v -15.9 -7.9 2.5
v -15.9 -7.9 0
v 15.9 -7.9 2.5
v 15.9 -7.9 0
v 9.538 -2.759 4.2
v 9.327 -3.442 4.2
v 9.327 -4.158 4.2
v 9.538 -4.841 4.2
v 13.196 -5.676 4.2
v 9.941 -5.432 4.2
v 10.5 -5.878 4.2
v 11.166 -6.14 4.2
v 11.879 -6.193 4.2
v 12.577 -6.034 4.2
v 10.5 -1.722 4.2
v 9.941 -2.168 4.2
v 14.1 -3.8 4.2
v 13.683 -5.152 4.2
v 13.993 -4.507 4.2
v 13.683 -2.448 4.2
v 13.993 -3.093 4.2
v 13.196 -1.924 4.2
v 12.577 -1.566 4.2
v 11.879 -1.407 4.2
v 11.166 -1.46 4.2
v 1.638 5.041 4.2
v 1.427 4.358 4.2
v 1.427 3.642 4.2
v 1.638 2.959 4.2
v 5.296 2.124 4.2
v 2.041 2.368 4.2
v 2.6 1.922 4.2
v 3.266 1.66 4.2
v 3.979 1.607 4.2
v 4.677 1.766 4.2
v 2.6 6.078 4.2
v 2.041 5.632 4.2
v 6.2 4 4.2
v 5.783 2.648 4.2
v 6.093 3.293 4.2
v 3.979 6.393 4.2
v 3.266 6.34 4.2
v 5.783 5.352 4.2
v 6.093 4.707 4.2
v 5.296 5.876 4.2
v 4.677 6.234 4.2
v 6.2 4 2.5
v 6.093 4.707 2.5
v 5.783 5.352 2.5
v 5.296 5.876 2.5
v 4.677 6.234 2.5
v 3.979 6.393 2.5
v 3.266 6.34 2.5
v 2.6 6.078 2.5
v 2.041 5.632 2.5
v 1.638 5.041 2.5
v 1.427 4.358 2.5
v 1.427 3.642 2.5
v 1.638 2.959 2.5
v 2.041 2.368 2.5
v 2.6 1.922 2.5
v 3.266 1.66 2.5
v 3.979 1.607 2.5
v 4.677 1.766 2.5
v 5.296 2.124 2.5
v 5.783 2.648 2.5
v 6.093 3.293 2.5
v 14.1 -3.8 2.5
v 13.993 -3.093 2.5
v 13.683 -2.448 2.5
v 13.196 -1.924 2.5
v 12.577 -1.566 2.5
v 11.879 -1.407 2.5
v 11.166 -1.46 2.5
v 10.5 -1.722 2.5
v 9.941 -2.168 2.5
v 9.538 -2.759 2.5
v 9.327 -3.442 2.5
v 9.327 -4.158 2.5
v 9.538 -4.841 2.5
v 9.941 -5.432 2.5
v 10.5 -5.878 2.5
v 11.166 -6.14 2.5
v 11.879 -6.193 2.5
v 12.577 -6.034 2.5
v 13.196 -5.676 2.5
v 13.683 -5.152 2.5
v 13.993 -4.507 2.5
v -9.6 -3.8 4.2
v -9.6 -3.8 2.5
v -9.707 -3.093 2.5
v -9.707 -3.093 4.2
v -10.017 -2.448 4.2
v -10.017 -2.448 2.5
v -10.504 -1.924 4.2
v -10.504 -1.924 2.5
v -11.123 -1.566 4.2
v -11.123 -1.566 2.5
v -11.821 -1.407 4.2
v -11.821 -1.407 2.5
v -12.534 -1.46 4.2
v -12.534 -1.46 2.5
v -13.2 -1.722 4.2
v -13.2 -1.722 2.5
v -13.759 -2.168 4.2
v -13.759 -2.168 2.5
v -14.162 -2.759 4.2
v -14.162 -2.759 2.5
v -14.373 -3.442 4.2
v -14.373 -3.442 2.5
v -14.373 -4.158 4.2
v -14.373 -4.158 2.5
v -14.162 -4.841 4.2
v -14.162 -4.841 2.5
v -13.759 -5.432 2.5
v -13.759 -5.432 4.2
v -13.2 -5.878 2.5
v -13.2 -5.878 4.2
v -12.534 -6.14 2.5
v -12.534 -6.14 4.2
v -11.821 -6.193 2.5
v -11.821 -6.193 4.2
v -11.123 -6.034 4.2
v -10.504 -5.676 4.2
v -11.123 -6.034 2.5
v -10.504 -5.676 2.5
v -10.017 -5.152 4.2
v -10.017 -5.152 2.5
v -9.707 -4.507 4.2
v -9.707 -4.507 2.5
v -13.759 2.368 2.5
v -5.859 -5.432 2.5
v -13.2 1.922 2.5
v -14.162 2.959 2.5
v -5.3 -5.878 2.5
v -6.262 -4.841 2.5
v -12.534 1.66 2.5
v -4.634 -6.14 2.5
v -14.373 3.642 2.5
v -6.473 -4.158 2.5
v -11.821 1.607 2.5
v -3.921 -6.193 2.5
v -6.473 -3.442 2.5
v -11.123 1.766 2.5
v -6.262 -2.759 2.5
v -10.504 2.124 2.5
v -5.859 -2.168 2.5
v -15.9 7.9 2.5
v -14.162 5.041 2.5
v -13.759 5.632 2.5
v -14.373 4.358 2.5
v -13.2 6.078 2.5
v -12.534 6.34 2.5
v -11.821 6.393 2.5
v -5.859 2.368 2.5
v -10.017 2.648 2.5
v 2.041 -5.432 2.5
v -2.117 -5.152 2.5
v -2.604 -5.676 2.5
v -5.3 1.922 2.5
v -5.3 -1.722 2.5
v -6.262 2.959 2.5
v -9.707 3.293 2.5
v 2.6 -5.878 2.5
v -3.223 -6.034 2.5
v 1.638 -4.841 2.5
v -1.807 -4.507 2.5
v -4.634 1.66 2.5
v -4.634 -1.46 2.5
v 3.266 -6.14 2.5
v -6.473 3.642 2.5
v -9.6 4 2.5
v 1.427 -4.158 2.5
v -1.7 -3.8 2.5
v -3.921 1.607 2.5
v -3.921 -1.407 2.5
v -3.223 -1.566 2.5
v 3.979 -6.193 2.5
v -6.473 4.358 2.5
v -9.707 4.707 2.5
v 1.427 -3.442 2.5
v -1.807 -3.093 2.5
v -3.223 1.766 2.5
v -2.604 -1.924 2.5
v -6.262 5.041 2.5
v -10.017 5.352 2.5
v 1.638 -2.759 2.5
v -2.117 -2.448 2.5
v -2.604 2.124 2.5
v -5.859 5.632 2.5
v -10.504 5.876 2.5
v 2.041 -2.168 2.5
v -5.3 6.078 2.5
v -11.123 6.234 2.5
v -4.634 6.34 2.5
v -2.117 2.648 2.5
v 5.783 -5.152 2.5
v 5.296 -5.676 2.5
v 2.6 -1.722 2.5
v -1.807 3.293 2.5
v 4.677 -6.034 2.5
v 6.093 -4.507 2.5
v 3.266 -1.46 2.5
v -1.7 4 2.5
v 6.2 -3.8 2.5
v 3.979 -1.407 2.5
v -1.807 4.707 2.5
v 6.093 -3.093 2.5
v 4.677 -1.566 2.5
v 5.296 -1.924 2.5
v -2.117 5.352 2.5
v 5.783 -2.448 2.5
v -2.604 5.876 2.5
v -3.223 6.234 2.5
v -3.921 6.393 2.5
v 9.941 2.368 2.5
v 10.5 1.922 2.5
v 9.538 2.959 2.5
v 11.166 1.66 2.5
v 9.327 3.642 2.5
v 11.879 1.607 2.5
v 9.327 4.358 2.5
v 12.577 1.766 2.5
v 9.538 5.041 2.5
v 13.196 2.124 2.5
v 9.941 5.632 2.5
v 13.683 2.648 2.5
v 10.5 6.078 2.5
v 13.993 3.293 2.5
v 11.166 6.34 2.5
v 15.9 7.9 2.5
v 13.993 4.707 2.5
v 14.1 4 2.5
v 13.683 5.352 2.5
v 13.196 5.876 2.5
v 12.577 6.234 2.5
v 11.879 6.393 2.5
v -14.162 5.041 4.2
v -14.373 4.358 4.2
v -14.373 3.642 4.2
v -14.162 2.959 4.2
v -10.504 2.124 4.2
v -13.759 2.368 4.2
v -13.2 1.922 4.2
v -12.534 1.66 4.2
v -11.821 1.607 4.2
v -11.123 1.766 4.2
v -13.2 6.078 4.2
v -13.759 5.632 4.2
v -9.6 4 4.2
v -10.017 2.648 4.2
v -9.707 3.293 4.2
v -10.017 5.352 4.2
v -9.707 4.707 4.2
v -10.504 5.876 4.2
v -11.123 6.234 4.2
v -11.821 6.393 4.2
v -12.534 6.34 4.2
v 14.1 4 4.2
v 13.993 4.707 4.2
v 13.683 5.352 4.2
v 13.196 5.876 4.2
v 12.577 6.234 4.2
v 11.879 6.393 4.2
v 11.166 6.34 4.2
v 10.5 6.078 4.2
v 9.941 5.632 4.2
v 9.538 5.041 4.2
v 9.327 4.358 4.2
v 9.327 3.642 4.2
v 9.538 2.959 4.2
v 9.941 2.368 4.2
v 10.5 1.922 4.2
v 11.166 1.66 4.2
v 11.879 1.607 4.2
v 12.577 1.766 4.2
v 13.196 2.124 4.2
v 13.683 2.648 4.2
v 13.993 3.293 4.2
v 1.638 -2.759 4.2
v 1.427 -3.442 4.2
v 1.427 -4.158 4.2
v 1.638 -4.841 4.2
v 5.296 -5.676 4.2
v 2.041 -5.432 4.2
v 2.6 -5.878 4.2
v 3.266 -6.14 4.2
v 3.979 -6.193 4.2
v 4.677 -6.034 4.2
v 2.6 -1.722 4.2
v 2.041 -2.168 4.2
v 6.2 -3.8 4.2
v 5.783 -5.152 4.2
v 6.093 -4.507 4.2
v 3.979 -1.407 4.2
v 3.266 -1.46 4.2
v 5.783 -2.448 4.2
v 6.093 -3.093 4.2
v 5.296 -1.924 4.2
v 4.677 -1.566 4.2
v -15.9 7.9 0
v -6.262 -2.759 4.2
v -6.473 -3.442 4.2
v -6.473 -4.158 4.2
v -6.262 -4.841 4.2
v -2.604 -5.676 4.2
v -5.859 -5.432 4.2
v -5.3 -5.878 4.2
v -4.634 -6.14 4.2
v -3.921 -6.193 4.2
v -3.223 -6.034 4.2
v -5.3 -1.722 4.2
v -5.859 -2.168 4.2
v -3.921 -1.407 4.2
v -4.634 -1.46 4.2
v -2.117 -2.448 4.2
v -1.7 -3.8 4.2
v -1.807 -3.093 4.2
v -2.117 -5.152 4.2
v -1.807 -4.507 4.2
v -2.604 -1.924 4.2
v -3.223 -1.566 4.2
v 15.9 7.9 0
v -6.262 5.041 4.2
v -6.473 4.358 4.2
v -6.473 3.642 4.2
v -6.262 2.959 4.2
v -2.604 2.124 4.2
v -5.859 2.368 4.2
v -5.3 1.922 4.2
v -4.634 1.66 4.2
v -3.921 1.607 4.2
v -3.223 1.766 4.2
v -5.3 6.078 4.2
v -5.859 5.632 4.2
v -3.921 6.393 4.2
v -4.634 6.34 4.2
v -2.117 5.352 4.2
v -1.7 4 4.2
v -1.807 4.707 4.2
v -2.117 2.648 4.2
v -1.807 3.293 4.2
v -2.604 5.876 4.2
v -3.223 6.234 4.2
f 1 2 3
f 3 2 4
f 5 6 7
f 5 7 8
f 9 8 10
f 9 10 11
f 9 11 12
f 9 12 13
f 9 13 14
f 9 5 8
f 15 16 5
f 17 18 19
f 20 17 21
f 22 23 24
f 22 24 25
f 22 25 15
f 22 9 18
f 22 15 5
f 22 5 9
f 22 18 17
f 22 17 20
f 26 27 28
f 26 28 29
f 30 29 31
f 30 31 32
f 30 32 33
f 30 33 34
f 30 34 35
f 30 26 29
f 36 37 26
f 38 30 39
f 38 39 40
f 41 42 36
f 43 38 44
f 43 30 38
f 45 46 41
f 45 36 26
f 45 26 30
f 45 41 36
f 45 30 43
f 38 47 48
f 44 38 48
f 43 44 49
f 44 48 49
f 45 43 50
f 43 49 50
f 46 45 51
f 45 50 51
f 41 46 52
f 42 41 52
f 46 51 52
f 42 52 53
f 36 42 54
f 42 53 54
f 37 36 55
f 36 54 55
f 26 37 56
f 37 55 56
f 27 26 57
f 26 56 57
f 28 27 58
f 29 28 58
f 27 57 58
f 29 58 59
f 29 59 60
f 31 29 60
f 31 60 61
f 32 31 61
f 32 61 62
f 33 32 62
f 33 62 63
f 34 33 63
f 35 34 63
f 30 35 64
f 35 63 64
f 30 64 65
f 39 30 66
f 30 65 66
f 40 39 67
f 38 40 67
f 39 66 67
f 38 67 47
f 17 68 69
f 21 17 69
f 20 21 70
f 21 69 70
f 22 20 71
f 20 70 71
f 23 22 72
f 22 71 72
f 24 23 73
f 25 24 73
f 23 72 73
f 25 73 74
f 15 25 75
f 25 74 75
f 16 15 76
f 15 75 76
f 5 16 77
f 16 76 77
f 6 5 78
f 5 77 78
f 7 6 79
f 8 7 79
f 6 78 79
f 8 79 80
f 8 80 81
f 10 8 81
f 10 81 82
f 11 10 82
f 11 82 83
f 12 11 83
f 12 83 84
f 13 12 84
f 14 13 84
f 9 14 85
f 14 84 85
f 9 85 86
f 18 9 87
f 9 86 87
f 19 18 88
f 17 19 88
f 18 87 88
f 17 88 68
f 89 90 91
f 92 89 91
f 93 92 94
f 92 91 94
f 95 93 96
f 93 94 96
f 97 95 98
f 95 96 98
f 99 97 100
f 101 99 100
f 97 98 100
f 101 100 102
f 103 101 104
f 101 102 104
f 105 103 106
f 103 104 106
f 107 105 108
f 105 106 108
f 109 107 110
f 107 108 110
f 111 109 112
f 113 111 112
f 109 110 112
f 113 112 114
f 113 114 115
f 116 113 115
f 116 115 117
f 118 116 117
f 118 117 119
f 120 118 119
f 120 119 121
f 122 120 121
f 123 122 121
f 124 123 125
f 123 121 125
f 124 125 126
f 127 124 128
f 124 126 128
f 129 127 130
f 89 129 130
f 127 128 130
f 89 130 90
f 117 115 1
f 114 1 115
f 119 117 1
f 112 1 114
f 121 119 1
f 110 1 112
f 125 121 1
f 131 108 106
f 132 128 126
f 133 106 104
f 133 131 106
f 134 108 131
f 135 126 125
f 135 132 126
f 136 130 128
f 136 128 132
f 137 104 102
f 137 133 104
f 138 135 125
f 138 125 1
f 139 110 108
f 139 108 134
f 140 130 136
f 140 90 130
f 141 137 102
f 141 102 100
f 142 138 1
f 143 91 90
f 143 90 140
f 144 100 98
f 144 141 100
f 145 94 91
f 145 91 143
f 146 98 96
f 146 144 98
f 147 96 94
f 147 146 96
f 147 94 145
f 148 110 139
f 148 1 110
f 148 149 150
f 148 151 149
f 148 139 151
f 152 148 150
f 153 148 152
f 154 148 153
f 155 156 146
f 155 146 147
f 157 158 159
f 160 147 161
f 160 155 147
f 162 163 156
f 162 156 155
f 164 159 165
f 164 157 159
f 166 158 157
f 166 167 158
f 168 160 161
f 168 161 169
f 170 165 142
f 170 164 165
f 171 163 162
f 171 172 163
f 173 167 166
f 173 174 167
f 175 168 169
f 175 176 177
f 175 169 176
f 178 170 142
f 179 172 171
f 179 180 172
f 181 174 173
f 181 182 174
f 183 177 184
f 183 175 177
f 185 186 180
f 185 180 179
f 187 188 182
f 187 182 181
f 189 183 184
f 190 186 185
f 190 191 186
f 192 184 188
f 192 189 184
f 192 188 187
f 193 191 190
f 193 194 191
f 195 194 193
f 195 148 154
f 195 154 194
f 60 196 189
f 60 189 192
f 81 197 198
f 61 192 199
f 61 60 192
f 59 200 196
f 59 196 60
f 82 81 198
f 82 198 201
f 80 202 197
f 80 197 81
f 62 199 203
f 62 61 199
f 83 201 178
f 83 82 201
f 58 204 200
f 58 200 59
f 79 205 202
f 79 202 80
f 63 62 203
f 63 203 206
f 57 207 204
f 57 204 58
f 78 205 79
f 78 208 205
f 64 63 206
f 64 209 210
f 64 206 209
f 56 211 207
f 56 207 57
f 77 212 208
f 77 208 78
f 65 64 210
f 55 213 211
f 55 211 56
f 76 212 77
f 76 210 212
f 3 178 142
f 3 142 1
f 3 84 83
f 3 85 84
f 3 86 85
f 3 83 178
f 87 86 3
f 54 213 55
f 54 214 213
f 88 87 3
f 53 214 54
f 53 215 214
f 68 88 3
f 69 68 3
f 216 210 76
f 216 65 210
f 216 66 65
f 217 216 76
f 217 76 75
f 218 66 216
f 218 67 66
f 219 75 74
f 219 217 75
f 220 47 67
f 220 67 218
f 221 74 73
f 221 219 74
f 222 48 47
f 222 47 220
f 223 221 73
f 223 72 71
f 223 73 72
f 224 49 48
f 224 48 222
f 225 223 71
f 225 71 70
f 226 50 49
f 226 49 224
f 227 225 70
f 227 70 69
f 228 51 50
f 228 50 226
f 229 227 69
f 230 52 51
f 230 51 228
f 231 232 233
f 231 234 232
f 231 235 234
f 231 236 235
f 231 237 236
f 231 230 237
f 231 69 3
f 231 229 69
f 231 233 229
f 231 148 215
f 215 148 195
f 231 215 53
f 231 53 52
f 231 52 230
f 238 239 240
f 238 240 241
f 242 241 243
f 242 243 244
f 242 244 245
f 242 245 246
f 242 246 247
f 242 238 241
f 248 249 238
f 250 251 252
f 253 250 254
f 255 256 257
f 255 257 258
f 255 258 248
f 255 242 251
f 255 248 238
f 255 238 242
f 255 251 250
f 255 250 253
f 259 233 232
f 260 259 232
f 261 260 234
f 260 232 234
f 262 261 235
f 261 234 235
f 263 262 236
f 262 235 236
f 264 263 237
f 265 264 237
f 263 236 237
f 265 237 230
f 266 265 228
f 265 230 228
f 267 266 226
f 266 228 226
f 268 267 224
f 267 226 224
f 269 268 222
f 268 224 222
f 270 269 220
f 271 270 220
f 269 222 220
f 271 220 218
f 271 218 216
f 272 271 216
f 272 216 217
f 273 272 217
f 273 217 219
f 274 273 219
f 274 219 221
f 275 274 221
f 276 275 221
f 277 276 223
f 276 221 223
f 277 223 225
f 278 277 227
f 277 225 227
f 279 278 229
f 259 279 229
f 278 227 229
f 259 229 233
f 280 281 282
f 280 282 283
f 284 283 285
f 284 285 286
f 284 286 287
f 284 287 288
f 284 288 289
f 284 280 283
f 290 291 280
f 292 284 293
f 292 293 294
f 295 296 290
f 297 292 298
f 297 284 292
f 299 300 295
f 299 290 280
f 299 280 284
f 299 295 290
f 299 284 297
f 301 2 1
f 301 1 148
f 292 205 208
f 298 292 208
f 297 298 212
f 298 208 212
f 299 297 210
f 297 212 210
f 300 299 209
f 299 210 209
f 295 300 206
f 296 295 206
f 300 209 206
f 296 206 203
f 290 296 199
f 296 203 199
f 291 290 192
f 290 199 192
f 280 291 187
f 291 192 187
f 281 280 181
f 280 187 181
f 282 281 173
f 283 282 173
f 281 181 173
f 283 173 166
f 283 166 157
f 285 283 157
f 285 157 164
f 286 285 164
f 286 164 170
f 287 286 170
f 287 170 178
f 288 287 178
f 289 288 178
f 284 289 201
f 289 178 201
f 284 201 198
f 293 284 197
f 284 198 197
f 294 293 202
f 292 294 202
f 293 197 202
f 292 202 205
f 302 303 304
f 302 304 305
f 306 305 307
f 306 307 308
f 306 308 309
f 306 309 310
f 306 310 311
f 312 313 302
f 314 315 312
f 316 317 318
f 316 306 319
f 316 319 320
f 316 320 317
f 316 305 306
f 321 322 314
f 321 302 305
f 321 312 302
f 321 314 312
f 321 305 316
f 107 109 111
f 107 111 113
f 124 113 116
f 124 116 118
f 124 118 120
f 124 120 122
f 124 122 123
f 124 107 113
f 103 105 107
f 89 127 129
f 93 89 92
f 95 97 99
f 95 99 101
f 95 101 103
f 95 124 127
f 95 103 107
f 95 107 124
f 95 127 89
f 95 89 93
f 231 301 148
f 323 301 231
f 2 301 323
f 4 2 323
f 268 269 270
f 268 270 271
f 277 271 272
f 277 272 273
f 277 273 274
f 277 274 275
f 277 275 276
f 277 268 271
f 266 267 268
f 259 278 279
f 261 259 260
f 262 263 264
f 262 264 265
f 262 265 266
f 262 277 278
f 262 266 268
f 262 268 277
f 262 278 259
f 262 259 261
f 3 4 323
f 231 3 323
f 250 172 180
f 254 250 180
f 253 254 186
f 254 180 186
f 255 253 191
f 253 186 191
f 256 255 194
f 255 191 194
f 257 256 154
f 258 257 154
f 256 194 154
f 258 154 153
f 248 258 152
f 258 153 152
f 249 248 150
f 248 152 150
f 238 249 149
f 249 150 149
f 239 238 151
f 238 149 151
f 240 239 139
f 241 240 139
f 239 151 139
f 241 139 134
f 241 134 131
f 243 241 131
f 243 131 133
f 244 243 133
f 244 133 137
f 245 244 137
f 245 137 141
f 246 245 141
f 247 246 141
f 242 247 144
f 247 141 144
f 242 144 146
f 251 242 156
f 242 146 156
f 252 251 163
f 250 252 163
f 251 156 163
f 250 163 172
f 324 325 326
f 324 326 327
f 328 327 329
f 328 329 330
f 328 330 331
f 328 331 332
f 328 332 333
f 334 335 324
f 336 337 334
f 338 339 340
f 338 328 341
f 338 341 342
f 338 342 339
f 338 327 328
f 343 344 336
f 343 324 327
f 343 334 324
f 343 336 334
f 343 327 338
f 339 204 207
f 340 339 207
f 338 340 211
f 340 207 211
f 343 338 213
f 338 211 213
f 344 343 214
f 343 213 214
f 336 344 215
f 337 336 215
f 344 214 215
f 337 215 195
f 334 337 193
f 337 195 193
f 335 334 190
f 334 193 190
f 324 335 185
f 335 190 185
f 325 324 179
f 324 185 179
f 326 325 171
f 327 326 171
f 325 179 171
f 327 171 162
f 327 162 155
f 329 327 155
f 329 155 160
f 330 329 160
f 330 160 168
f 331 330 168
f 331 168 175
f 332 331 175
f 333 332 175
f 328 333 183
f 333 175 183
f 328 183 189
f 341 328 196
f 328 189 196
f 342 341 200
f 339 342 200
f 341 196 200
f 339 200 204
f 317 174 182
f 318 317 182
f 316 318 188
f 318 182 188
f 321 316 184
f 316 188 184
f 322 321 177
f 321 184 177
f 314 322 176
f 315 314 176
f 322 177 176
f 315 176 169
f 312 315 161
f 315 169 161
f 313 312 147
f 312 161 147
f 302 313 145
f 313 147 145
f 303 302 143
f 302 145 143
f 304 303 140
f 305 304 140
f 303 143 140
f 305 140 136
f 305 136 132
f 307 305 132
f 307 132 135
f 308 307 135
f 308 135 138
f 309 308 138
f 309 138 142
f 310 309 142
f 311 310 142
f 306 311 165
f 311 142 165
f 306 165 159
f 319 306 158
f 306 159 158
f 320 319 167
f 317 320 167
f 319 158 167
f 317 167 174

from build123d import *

# Parameters (mm, degrees)
F0_W     = 31.8
F0_H     = 15.8
F1_DEPTH = 2.5
F2_R     = 2.4
F3_DEPTH = 1.7


with BuildPart() as f1:
    # F0 (on Top) → F1 (new body)
    with BuildSketch(Plane.XY):
        Rectangle(F0_W, F0_H)
    extrude(amount=F1_DEPTH)

    # F2 (on face) → F3 (join)
    with BuildSketch(Plane.XY.offset(2.5)):
        with Locations((-12, 4)):
            Circle(F2_R)
        with Locations((-12, -3.8)):
            Circle(F2_R)
        with Locations((-4.1, -3.8)):
            Circle(F2_R)
        with Locations((-4.1, 4)):
            Circle(F2_R)
        with Locations((3.8, 4)):
            Circle(F2_R)
        with Locations((11.7, -3.8)):
            Circle(F2_R)
        with Locations((11.7, 4)):
            Circle(F2_R)
        with Locations((3.8, -3.8)):
            Circle(F2_R)
    extrude(amount=F3_DEPTH)


solid = f1.part
